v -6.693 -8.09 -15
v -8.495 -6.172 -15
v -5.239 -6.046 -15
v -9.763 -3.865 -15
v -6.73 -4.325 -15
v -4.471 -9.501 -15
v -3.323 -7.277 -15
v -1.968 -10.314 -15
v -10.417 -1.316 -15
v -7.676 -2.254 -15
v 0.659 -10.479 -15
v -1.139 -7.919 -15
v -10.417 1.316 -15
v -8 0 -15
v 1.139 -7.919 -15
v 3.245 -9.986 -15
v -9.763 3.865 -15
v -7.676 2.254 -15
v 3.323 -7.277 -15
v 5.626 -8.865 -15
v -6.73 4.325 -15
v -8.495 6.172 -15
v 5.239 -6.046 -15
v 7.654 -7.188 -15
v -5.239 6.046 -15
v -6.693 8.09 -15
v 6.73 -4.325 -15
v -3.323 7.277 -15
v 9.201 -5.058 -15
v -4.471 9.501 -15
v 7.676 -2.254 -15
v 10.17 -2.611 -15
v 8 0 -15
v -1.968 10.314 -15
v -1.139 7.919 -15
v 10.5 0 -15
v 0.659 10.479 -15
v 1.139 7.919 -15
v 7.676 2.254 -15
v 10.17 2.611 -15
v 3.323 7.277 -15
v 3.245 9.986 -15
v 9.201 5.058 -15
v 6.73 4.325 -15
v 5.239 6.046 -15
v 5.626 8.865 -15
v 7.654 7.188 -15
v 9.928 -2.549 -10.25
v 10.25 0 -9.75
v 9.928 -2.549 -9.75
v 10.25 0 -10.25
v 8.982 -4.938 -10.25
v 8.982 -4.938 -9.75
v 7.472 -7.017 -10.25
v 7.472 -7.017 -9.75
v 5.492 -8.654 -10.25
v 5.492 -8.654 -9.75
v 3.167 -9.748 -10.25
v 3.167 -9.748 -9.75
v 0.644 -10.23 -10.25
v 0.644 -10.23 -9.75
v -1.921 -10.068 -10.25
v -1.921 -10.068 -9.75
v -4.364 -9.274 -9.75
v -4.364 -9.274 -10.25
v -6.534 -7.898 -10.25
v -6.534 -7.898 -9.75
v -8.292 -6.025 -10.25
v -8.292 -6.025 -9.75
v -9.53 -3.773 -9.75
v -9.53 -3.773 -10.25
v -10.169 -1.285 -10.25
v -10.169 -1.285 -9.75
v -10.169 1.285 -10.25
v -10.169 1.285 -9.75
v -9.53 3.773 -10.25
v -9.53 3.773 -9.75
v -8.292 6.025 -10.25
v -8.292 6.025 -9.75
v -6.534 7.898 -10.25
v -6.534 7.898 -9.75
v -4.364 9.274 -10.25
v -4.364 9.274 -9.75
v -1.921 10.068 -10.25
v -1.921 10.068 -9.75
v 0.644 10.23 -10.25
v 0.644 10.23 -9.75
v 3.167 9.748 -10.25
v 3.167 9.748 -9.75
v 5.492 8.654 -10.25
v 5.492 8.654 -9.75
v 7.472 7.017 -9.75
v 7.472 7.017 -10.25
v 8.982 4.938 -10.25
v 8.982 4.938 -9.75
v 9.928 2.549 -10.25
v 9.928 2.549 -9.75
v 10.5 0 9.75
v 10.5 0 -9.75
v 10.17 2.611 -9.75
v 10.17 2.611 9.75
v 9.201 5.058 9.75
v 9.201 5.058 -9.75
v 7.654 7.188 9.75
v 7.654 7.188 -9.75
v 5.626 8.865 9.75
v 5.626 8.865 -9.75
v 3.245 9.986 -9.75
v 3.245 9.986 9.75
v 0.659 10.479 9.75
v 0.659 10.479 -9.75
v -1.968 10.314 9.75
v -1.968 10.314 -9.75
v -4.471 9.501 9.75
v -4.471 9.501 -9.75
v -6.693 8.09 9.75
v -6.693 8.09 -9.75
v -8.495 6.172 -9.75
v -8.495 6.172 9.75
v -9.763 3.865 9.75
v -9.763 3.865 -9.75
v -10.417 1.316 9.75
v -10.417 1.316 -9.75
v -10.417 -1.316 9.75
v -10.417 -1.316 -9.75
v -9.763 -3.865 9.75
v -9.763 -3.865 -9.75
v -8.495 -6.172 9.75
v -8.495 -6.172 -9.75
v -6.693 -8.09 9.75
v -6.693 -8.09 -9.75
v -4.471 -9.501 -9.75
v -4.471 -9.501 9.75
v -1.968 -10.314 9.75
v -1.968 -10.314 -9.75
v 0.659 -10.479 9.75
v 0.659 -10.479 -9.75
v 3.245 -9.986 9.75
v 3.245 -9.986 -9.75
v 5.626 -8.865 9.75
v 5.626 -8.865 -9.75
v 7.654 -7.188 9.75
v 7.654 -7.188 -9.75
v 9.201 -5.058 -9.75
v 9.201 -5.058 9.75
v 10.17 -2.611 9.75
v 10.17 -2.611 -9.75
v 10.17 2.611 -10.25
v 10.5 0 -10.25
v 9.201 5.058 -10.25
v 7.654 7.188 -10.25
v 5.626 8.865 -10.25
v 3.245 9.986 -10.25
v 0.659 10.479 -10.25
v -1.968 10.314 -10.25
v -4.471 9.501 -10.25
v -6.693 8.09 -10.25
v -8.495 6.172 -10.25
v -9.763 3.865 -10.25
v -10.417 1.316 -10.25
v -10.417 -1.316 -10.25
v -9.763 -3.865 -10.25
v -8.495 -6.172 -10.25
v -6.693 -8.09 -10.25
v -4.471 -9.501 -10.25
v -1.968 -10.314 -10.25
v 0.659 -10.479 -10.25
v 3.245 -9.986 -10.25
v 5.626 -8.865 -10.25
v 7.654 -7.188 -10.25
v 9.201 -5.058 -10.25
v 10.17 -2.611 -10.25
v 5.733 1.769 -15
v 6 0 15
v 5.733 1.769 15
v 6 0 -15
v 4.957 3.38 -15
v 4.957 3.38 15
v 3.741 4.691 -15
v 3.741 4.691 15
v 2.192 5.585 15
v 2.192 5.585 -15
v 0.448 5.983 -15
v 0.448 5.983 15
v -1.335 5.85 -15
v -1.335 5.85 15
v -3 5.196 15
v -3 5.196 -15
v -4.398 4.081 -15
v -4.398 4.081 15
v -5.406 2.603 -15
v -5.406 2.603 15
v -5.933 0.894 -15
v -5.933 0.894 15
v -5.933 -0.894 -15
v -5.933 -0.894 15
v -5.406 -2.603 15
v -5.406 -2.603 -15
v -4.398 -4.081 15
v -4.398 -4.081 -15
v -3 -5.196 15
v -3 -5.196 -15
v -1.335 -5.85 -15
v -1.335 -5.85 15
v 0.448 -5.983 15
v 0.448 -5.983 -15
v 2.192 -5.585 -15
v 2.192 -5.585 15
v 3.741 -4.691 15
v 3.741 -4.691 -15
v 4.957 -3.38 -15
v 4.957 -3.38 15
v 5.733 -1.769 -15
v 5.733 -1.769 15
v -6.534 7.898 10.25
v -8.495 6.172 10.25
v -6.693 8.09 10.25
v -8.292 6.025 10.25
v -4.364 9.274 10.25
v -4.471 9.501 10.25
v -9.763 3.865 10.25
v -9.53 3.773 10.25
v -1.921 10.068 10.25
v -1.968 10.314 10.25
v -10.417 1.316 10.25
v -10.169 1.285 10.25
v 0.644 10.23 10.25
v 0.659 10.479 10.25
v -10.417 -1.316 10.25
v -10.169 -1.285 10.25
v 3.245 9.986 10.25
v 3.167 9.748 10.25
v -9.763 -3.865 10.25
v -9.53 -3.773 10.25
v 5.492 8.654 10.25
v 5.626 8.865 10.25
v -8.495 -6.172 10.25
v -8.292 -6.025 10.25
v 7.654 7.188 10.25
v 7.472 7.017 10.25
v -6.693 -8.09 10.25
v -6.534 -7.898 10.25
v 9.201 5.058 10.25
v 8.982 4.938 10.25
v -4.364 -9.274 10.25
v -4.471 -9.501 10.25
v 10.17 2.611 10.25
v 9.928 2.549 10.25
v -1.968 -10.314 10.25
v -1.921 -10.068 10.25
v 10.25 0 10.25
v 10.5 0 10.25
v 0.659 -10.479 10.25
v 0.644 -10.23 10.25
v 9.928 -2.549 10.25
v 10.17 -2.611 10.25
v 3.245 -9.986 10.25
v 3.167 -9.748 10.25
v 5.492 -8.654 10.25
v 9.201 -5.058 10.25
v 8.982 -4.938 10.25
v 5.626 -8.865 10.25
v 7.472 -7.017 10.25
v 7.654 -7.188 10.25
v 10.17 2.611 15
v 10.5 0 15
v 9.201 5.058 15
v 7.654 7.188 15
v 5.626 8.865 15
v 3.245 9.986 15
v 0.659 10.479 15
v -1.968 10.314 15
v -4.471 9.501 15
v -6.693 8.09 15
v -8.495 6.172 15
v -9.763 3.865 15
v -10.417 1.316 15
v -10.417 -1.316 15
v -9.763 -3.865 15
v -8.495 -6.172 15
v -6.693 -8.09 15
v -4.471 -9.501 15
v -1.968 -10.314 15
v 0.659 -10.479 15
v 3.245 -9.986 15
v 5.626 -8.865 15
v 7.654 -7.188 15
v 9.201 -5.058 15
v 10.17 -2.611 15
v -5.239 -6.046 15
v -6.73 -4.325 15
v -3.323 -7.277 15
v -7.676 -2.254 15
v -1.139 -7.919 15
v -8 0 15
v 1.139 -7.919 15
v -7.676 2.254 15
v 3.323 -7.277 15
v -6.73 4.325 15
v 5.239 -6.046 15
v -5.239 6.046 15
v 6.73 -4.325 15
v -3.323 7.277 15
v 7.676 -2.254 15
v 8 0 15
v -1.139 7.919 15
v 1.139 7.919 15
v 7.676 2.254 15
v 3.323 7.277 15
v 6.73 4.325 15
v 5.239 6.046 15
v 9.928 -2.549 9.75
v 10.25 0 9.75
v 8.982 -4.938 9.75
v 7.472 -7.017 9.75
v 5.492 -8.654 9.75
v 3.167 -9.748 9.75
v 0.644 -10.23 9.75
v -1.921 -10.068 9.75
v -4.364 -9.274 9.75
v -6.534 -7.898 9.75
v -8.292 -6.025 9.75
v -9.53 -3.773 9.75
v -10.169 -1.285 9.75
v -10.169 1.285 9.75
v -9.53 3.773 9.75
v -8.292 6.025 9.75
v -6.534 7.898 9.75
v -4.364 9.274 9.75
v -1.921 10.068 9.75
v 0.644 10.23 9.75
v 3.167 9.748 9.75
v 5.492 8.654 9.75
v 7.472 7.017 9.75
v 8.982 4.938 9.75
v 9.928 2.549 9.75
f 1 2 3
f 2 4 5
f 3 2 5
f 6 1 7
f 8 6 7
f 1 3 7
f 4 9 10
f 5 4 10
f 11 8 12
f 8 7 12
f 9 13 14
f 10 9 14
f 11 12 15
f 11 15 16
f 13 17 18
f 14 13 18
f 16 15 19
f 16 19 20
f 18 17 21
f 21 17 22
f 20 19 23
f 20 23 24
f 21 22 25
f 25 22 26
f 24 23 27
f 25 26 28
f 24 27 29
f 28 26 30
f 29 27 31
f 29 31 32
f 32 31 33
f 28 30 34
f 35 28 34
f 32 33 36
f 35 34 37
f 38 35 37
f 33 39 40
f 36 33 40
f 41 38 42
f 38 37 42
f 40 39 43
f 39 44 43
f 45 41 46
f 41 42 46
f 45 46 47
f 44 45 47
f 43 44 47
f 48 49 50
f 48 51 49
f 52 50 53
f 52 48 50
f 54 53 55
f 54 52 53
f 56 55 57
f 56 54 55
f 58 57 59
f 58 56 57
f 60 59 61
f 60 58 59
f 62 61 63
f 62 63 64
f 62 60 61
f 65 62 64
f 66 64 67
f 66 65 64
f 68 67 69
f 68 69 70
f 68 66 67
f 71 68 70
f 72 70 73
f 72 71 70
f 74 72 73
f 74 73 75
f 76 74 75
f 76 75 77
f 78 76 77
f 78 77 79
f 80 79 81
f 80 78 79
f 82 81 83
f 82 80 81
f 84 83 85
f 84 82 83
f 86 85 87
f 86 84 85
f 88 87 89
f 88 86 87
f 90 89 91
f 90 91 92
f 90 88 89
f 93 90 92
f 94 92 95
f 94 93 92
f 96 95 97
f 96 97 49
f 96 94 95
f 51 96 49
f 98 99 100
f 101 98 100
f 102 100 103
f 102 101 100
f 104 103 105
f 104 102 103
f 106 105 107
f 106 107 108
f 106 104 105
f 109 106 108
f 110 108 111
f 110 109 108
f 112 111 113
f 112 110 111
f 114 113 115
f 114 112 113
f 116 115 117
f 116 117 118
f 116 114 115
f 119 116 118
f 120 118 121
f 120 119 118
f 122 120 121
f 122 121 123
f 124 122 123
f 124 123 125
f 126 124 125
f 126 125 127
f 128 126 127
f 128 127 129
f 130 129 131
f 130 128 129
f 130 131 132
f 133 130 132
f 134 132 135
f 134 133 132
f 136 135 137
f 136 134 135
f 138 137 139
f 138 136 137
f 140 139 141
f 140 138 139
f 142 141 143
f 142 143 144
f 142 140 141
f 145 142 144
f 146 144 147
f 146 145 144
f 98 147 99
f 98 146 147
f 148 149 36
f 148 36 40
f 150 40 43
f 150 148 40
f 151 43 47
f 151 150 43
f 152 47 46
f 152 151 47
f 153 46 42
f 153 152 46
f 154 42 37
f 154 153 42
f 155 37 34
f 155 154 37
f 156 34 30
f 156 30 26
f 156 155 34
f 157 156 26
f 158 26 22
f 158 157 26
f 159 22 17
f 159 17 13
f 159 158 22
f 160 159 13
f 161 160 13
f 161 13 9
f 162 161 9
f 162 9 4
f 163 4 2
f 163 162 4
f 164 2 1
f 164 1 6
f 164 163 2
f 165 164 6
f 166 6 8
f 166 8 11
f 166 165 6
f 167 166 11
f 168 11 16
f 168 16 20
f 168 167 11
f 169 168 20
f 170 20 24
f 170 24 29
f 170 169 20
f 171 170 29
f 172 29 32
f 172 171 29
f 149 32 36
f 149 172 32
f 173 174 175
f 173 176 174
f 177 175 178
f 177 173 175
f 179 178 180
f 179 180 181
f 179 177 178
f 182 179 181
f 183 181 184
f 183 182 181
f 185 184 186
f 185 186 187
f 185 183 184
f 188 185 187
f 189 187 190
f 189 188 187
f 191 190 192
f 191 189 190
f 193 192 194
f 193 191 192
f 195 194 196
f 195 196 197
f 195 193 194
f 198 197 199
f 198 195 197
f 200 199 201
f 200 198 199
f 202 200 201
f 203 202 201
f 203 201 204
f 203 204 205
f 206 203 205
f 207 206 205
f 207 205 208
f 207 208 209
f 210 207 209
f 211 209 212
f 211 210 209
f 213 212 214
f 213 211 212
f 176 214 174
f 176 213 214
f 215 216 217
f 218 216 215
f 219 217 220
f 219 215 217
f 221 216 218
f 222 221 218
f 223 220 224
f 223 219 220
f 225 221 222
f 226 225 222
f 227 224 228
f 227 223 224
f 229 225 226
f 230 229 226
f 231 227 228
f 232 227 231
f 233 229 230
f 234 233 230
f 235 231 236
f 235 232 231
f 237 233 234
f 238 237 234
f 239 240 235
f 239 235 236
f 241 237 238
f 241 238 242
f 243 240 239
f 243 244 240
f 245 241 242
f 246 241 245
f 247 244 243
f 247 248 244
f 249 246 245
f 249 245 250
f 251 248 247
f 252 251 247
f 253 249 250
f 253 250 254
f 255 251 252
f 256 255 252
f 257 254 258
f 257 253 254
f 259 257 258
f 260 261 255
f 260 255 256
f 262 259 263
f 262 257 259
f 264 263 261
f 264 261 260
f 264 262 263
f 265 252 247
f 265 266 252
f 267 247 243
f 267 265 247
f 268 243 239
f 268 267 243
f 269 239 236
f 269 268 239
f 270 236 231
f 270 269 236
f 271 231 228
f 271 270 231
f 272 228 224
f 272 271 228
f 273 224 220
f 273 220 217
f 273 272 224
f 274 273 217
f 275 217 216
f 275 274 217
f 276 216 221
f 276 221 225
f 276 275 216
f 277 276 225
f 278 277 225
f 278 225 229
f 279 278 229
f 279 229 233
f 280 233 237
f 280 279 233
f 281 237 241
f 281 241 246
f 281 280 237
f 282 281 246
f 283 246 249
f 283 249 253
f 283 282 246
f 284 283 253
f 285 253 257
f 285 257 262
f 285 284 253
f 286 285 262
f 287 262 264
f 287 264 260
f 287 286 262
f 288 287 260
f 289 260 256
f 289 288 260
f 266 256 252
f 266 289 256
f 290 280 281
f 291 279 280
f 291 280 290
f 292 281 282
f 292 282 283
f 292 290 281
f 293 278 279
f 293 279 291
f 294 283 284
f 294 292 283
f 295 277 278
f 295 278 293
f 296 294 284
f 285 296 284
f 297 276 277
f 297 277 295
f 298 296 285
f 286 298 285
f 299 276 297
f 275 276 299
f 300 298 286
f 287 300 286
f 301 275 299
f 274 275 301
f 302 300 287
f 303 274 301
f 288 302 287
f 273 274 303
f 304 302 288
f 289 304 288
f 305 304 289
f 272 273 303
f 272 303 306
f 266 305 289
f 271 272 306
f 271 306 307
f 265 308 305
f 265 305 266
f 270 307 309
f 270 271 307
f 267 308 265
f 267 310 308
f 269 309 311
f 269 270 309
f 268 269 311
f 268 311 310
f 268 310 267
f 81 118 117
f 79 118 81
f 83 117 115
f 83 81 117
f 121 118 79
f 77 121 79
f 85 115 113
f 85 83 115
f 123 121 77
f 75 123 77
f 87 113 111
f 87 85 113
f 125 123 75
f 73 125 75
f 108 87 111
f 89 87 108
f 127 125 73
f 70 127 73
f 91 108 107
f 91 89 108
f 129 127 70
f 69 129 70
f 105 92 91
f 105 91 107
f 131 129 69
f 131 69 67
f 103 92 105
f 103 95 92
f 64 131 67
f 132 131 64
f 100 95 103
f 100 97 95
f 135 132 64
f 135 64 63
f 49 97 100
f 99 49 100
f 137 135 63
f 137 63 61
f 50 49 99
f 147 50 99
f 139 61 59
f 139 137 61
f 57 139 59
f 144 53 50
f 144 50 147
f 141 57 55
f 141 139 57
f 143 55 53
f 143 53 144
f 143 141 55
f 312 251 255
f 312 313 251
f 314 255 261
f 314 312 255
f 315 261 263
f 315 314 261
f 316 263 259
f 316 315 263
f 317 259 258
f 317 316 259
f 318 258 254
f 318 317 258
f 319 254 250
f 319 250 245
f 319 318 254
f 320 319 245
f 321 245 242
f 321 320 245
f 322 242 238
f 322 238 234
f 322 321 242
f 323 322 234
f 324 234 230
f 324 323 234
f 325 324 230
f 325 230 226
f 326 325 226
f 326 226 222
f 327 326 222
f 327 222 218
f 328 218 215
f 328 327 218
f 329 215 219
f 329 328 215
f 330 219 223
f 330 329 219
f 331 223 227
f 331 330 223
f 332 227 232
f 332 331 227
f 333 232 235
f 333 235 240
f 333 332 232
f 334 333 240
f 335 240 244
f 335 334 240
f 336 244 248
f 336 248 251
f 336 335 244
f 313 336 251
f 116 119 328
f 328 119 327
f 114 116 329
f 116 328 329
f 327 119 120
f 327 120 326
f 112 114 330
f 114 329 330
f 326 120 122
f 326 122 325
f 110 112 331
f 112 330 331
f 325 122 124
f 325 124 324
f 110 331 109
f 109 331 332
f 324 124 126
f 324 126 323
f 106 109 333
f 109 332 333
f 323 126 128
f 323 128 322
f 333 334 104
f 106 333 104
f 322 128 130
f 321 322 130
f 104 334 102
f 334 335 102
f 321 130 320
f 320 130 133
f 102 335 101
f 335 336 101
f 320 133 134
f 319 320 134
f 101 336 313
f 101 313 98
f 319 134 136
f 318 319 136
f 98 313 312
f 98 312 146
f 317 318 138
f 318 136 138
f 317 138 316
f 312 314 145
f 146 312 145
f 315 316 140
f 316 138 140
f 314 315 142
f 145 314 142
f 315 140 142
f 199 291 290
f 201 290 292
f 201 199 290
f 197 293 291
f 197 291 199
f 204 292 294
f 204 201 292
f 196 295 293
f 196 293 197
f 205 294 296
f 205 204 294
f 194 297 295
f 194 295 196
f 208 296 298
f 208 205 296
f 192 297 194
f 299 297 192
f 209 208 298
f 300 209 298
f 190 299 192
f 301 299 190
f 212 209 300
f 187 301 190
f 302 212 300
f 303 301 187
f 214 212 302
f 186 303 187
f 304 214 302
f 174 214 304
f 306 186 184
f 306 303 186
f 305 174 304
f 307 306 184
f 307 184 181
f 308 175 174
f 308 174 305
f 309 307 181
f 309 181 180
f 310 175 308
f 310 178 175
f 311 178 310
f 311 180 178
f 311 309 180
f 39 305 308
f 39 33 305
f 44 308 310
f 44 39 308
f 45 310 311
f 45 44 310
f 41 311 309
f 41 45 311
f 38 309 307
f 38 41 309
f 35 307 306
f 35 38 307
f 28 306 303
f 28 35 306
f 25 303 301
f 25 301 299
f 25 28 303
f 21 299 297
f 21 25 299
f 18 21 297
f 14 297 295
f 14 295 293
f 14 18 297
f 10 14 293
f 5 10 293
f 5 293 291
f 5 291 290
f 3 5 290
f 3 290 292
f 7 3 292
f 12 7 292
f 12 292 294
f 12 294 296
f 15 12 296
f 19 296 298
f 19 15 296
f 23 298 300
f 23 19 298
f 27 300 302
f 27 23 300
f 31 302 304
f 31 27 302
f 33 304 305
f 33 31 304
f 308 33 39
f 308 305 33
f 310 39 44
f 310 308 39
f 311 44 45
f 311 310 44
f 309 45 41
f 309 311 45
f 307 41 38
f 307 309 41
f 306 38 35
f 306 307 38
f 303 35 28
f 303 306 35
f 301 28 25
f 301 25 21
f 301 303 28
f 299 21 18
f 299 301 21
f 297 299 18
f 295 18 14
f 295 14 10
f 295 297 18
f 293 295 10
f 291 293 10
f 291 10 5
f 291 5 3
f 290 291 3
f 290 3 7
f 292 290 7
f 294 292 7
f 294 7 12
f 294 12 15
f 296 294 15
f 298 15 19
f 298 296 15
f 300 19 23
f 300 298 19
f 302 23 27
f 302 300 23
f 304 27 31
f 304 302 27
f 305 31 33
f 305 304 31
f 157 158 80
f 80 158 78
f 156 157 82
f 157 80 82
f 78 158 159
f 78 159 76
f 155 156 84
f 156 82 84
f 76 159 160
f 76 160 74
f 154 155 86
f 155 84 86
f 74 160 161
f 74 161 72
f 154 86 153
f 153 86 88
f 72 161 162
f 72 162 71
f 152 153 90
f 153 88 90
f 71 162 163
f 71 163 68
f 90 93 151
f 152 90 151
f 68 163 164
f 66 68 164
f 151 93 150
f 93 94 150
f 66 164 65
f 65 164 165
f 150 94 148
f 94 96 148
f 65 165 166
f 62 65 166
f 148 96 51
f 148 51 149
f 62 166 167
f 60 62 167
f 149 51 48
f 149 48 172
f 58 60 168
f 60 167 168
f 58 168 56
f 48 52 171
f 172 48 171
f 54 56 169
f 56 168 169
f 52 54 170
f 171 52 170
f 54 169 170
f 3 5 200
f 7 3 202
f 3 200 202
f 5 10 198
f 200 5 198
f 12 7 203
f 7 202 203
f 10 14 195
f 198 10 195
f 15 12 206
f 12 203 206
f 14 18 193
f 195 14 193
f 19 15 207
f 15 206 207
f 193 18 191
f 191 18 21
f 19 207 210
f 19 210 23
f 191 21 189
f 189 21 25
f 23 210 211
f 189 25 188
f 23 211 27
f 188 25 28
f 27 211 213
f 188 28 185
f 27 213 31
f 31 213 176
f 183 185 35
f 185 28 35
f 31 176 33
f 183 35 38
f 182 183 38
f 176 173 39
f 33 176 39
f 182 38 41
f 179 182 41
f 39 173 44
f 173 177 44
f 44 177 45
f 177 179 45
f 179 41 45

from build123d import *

# Parameters (mm, degrees)
SKETCH1_R           = 10.5
SKETCH1_R_2         = 8
BOSS_EXTRUDE1_DEPTH = 15
SKETCH2_R           = 8
SKETCH2_R_2         = 6
BOSS_EXTRUDE2_DEPTH = 15
SKETCH3_W           = 0.5
SKETCH3_H           = 0.5


with BuildPart() as part:
    # Sketch1 → Boss-Extrude1 (new, symmetric)
    with BuildSketch(Plane.XY):
        Circle(SKETCH1_R)
        Circle(SKETCH1_R_2, mode=Mode.SUBTRACT)
    extrude(amount=BOSS_EXTRUDE1_DEPTH, both=True)

    # Sketch3 → Cut-Revolve1 (revolve, cut)
    with BuildSketch(Plane(origin=(0, 0, 0), x_dir=(1, 0, 0), z_dir=(0, 1, 0)), mode=Mode.PRIVATE) as cut_revolve1_sk:
        with Locations((-10.5, -10)):
            Rectangle(SKETCH3_W, SKETCH3_H)
        with Locations((-10.5, 10)):
            Rectangle(SKETCH3_W, SKETCH3_H)
    revolve(cut_revolve1_sk.sketch.rotate(Axis((0, 0, 15), (0, 0, -1)), 180), axis=Axis((0, 0, 15), (0, 0, -1)), mode=Mode.SUBTRACT)


with BuildPart() as body_2:
    # Sketch2 → Boss-Extrude2 (new, symmetric)
    with BuildSketch(Plane.XY):
        Circle(SKETCH2_R)
        Circle(SKETCH2_R_2, mode=Mode.SUBTRACT)
    extrude(amount=BOSS_EXTRUDE2_DEPTH, both=True)


solid = Compound([part.part, body_2.part])
